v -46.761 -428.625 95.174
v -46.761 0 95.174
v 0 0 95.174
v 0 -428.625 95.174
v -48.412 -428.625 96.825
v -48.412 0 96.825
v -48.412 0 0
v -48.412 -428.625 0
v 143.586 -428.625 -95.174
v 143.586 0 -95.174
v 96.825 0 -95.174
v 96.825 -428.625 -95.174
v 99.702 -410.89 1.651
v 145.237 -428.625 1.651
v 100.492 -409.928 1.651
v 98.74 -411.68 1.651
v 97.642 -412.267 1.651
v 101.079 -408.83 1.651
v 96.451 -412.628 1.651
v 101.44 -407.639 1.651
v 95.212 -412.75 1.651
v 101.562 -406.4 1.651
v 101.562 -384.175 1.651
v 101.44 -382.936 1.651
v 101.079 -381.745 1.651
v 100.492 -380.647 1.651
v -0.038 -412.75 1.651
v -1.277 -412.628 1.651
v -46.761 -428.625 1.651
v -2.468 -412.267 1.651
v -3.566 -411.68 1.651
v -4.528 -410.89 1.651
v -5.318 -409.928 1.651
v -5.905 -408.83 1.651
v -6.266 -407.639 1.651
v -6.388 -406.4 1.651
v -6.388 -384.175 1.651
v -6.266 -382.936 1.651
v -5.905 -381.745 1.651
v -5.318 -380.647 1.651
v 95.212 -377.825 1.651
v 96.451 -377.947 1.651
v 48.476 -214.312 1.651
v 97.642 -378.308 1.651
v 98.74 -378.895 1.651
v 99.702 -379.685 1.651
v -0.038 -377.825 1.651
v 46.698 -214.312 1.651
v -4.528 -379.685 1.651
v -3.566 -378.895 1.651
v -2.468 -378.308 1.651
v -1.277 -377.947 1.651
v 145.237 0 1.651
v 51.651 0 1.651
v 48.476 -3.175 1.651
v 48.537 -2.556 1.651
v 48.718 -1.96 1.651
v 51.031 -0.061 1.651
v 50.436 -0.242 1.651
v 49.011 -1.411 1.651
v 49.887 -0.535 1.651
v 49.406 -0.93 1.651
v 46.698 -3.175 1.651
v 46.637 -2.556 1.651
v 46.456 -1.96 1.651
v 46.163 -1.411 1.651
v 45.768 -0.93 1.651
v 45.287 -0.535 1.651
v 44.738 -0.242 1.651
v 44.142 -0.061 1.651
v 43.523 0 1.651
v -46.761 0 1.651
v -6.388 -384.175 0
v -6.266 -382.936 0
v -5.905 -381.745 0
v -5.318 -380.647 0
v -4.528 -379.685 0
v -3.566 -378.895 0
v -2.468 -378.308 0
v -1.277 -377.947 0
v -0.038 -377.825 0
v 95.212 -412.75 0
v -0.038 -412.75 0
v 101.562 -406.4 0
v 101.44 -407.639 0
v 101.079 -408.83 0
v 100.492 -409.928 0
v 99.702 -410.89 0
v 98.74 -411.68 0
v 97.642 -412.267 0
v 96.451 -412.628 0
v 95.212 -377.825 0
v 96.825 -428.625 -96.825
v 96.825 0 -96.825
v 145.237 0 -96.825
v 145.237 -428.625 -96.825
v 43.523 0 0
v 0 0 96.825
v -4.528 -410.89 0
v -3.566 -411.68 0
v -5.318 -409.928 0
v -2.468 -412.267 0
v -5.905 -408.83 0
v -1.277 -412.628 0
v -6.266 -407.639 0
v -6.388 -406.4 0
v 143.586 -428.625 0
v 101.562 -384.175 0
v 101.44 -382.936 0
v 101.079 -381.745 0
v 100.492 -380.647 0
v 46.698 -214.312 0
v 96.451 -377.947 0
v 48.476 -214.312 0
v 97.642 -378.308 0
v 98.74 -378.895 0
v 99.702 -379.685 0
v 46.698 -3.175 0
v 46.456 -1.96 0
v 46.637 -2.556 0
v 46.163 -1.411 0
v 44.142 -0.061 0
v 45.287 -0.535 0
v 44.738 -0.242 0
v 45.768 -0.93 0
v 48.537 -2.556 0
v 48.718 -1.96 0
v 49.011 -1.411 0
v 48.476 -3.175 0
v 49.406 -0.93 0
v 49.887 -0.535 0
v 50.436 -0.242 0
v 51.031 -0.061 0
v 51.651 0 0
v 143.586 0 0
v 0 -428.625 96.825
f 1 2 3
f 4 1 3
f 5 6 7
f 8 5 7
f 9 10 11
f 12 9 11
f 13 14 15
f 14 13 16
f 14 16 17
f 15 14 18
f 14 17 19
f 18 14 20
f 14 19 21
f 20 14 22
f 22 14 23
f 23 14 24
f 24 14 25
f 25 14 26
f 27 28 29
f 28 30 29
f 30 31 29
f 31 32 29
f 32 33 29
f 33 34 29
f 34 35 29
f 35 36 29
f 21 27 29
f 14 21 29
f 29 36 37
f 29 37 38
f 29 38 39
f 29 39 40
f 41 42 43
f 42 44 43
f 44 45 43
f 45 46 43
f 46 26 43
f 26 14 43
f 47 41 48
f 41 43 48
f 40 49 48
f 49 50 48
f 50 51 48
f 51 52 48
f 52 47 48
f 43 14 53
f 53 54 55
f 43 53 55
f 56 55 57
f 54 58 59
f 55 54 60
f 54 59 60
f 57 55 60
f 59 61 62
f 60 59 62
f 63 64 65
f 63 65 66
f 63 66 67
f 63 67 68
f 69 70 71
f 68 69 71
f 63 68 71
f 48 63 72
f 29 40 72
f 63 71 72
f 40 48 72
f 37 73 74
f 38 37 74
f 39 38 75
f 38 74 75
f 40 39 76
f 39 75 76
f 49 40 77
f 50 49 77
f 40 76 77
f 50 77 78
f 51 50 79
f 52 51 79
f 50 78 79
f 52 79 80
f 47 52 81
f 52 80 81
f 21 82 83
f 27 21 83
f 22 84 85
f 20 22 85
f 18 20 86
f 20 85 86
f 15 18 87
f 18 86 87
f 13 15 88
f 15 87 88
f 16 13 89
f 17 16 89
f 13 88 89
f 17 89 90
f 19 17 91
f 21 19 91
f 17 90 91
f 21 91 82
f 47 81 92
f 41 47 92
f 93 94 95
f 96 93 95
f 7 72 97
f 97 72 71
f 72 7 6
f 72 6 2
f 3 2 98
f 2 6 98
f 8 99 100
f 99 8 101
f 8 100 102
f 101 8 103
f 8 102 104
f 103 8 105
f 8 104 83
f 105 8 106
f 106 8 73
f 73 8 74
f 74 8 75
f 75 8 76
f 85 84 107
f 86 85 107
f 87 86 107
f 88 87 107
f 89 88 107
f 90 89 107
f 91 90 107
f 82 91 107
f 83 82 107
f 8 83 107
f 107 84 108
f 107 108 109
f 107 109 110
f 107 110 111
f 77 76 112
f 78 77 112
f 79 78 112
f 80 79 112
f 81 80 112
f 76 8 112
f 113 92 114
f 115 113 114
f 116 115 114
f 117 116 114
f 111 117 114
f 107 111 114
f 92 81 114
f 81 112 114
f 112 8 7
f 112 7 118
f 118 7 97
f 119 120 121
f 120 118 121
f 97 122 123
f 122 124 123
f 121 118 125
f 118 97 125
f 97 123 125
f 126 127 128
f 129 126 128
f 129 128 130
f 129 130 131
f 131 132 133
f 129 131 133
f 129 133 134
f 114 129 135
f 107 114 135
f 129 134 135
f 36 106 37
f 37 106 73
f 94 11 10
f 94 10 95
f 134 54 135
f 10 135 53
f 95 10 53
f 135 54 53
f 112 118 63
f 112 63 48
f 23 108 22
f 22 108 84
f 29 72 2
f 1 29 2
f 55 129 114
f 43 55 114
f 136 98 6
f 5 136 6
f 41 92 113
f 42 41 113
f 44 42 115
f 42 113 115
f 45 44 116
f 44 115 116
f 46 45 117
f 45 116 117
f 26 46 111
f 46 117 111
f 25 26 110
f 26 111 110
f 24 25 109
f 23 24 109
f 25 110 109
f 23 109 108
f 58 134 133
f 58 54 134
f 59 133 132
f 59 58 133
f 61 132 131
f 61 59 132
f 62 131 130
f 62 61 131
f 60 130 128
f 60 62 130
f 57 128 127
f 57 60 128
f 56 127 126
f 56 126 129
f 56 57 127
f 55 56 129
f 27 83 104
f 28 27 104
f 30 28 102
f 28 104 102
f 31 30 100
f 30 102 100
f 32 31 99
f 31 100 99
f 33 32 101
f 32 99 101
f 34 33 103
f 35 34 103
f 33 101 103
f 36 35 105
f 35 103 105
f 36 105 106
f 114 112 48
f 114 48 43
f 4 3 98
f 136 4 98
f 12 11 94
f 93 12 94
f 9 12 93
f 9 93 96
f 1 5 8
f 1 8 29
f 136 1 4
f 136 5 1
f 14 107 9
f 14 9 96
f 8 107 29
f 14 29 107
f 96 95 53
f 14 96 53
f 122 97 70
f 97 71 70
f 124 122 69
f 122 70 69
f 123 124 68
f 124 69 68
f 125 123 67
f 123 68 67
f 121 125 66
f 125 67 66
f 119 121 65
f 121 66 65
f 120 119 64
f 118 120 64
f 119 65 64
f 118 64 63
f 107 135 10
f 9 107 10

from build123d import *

# Parameters (mm, degrees)
F1_DEPTH = 428.625
F2_W     = 1.778
F2_H     = 214.3125
F3_DEPTH = 1.651
F4_R     = 3.175
F5_R     = 0.762
F6_DEPTH = 25.4


with BuildPart() as f1:
    # F0 (on Front) → F1 (new body)
    with BuildSketch(Plane.XZ):
        Polygon((0, 95.1738), (0, 96.8248), (-48.4124, 96.8248), (-48.4124, 0), (143.5862, 0), (143.5862, -95.1738), (96.8248, -95.1738), (96.8248, -96.8248), (145.2372, -96.8248), (145.2372, 1.651), (-46.7614, 1.651), (-46.7614, 95.1738), align=None)
    extrude(amount=F1_DEPTH)

    # F2 (on face) → F3 (cut)
    with BuildSketch(Plane(origin=(0, 0, 0), x_dir=(1, 0, 0), z_dir=(0, 0, -1))):
        with Locations((47.5869, 107.15625)):
            Rectangle(F2_W, F2_H)
        with BuildLine():
            Line((101.5619, 384.175), (101.5619, 406.4))
            ThreePointArc((101.5619, 406.4), (99.7020280605, 410.8901280605), (95.2119, 412.75))
            Line((95.2119, 412.75), (-0.0381, 412.75))
            ThreePointArc((-0.0381, 412.75), (-4.5282280605, 410.8901280605), (-6.3881, 406.4))
            Line((-6.3881, 406.4), (-6.3881, 384.175))
            ThreePointArc((-6.3881, 384.175), (-4.5282280605, 379.6848719395), (-0.0381, 377.825))
            Line((-0.0381, 377.825), (95.2119, 377.825))
            ThreePointArc((95.2119, 377.825), (99.7020280605, 379.6848719395), (101.5619, 384.175))
        make_face()
    extrude(amount=-F3_DEPTH, mode=Mode.SUBTRACT)

    # F4
    f4_edges = [f1.edges().sort_by_distance(p)[0] for p in [
        (48.4759, 0, 0.8255),
        (46.6979, 0, 0.8255),
    ]]
    fillet(f4_edges, radius=F4_R)

    # F5
    f5_edges = [f1.edges().sort_by_distance(p)[0] for p in [
        (46.6979, -214.3125, 0.8255),
        (48.4759, -214.3125, 0.8255),
    ]]
    fillet(f5_edges, radius=F5_R)

    # F2 (on face) → F6 (cut)
    with BuildSketch(Plane(origin=(0, 0, 0), x_dir=(1, 0, 0), z_dir=(0, 0, -1))):
        with Locations((47.5869, 107.15625)):
            Rectangle(F2_W, F2_H)
        with BuildLine():
            Line((101.5619, 384.175), (101.5619, 406.4))
            ThreePointArc((101.5619, 406.4), (99.7020280605, 410.8901280605), (95.2119, 412.75))
            Line((95.2119, 412.75), (-0.0381, 412.75))
            ThreePointArc((-0.0381, 412.75), (-4.5282280605, 410.8901280605), (-6.3881, 406.4))
            Line((-6.3881, 406.4), (-6.3881, 384.175))
            ThreePointArc((-6.3881, 384.175), (-4.5282280605, 379.6848719395), (-0.0381, 377.825))
            Line((-0.0381, 377.825), (95.2119, 377.825))
            ThreePointArc((95.2119, 377.825), (99.7020280605, 379.6848719395), (101.5619, 384.175))
        make_face()
    extrude(amount=-F6_DEPTH, mode=Mode.SUBTRACT)


solid = f1.part
